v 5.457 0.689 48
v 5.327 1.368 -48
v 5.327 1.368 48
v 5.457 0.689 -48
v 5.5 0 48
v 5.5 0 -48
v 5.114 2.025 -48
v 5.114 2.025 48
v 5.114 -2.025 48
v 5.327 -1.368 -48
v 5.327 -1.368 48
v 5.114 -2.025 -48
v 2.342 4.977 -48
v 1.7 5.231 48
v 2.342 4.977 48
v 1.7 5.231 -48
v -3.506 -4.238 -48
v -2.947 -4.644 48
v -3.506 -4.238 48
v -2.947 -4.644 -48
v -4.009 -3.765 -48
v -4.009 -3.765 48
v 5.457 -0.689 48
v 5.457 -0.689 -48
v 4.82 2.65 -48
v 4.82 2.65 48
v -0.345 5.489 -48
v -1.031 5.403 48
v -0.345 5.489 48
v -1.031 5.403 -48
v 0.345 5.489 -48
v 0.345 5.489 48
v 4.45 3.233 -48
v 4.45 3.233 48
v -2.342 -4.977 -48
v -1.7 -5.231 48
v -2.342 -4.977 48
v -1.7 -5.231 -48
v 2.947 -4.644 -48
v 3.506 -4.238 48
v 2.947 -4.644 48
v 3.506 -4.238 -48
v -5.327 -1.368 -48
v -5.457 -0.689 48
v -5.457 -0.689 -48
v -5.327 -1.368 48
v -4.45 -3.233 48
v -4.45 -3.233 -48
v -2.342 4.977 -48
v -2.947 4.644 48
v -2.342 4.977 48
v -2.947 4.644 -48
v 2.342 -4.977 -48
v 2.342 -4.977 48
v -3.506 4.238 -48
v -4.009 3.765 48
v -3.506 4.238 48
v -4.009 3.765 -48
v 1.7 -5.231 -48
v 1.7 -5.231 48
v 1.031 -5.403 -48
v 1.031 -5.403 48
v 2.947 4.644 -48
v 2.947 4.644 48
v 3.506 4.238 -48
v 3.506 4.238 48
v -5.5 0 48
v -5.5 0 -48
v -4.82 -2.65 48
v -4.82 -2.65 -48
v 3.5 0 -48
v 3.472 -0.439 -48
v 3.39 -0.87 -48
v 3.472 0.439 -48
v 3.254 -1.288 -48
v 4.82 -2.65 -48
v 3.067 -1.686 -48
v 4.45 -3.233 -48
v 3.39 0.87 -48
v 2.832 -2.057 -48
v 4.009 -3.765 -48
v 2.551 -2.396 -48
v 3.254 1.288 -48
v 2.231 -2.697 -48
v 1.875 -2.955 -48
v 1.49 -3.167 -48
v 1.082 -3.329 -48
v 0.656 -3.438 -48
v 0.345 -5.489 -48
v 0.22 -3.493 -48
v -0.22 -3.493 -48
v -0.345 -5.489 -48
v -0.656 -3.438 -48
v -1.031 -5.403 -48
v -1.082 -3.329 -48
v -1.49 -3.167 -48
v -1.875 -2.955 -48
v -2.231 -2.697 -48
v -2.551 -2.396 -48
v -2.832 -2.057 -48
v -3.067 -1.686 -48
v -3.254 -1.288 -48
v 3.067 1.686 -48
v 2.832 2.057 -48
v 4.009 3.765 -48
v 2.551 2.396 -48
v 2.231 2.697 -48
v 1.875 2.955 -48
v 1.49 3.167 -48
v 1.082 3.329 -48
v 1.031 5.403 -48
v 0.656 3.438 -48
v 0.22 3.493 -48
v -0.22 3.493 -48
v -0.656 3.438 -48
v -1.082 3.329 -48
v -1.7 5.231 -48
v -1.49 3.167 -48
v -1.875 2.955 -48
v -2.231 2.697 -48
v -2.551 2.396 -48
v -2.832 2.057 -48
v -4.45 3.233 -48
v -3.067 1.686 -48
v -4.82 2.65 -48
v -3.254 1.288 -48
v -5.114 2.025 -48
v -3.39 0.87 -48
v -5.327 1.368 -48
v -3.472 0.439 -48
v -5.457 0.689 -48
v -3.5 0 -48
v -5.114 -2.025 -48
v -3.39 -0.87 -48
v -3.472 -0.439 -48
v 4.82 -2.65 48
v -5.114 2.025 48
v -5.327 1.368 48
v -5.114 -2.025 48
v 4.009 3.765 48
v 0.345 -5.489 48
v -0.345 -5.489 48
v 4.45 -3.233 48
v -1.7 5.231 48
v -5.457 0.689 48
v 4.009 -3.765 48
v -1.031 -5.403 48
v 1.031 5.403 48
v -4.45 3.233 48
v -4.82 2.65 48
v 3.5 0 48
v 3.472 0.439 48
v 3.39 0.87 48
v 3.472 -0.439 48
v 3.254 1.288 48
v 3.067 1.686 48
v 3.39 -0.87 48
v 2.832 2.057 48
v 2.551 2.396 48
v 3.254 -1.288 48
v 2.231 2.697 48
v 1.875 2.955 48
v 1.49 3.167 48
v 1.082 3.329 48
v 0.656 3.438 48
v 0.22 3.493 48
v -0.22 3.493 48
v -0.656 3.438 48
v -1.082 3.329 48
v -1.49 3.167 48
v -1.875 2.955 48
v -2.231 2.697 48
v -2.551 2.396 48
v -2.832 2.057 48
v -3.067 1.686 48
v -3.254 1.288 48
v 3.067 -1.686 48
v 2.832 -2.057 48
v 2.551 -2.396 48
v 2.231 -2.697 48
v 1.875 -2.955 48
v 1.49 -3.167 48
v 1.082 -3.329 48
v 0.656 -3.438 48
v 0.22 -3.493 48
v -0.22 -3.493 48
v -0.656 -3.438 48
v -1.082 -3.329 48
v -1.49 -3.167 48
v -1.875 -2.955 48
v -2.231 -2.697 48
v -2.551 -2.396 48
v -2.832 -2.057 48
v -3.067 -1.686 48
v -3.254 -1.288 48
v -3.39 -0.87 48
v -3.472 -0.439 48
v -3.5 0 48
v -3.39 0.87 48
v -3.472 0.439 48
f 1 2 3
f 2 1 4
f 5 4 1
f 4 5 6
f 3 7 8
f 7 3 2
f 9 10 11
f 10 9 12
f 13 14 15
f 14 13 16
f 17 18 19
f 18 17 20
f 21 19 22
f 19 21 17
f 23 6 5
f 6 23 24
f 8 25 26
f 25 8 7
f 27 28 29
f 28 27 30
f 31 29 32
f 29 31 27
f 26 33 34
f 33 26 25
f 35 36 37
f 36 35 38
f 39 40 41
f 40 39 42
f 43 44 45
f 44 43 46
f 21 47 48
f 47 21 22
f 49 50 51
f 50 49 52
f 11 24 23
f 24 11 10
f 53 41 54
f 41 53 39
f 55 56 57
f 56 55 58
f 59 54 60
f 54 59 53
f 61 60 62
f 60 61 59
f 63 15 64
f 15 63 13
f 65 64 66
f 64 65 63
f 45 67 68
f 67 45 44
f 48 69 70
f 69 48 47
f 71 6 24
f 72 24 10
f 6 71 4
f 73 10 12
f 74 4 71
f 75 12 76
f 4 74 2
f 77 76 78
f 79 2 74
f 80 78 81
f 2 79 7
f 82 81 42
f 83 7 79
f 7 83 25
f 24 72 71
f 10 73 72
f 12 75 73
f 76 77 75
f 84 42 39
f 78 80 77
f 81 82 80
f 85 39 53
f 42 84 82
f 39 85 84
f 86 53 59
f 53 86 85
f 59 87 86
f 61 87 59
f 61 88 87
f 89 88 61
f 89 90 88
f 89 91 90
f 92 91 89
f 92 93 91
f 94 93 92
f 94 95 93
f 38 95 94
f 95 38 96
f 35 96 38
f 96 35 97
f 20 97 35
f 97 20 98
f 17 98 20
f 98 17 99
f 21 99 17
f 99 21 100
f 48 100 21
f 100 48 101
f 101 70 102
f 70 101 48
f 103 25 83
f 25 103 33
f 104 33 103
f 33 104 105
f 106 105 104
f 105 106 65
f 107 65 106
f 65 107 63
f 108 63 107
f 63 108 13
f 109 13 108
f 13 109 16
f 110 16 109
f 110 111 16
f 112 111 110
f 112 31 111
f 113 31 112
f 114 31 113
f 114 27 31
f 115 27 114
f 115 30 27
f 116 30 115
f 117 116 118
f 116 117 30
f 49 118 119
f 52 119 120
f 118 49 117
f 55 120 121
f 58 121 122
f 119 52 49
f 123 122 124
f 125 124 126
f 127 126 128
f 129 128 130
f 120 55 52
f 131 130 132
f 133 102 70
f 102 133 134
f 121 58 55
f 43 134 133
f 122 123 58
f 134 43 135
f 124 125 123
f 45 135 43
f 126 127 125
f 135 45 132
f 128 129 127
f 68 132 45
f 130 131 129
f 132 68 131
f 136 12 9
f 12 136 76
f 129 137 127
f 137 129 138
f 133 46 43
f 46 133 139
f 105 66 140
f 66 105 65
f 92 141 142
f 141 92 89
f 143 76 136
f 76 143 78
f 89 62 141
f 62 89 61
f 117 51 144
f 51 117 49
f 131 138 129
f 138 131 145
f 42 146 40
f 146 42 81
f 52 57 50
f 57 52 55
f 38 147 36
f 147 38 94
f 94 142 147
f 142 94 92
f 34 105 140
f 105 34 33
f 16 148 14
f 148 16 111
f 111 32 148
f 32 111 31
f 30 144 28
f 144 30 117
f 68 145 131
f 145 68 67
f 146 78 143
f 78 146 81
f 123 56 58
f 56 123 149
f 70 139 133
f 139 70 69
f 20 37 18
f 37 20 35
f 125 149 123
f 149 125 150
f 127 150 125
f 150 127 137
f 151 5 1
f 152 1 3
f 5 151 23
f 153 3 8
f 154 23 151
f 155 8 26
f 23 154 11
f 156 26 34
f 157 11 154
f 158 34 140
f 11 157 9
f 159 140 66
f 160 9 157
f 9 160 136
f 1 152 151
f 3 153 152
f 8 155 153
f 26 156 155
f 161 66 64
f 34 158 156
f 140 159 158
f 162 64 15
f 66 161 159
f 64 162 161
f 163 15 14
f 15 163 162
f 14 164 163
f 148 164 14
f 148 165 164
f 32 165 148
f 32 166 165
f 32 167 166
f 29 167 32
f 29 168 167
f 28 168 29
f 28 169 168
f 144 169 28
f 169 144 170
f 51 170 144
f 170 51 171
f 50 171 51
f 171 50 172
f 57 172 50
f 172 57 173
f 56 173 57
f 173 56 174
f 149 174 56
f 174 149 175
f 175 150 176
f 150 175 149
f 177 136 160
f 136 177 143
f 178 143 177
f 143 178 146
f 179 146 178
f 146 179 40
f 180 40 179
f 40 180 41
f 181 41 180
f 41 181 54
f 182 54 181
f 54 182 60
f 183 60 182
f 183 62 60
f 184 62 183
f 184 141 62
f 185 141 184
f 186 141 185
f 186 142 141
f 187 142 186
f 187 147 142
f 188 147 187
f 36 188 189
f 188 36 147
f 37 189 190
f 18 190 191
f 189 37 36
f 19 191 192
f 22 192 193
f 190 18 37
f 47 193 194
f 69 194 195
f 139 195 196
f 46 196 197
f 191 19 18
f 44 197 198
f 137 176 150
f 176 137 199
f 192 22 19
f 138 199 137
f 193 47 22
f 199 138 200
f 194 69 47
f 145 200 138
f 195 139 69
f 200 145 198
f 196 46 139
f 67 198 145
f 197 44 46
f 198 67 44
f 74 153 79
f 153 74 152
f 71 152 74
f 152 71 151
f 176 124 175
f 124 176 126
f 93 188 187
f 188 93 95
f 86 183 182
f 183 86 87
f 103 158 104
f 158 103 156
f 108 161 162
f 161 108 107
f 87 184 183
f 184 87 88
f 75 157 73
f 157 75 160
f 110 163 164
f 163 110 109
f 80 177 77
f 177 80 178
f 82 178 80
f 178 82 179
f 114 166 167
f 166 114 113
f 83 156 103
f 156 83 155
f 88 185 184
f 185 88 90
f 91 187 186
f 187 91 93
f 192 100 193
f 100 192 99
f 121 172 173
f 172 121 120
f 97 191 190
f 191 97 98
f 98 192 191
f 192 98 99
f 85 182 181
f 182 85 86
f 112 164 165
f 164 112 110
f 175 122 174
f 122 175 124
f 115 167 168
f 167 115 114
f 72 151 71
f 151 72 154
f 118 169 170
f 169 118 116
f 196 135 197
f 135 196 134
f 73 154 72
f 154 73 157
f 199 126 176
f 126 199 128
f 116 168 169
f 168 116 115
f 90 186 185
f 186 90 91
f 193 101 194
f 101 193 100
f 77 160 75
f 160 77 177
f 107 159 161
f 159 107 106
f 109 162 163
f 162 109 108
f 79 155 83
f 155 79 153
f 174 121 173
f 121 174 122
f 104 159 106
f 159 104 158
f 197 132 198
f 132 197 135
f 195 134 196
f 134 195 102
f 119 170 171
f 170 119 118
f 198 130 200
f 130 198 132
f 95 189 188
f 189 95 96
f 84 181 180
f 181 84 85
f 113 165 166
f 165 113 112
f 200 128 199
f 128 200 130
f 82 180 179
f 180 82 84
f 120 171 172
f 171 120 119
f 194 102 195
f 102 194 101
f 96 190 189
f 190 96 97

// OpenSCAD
$fn = 50;


difference() {
	union() {
		translate(v = [0, 0, -48.0000000000]) {
			cylinder(h = 96, r = 5.5000000000);
		}
	}
	union() {
		translate(v = [0, 0, -100.0000000000]) {
			cylinder(h = 200, r = 3.5000000000);
		}
	}
}
